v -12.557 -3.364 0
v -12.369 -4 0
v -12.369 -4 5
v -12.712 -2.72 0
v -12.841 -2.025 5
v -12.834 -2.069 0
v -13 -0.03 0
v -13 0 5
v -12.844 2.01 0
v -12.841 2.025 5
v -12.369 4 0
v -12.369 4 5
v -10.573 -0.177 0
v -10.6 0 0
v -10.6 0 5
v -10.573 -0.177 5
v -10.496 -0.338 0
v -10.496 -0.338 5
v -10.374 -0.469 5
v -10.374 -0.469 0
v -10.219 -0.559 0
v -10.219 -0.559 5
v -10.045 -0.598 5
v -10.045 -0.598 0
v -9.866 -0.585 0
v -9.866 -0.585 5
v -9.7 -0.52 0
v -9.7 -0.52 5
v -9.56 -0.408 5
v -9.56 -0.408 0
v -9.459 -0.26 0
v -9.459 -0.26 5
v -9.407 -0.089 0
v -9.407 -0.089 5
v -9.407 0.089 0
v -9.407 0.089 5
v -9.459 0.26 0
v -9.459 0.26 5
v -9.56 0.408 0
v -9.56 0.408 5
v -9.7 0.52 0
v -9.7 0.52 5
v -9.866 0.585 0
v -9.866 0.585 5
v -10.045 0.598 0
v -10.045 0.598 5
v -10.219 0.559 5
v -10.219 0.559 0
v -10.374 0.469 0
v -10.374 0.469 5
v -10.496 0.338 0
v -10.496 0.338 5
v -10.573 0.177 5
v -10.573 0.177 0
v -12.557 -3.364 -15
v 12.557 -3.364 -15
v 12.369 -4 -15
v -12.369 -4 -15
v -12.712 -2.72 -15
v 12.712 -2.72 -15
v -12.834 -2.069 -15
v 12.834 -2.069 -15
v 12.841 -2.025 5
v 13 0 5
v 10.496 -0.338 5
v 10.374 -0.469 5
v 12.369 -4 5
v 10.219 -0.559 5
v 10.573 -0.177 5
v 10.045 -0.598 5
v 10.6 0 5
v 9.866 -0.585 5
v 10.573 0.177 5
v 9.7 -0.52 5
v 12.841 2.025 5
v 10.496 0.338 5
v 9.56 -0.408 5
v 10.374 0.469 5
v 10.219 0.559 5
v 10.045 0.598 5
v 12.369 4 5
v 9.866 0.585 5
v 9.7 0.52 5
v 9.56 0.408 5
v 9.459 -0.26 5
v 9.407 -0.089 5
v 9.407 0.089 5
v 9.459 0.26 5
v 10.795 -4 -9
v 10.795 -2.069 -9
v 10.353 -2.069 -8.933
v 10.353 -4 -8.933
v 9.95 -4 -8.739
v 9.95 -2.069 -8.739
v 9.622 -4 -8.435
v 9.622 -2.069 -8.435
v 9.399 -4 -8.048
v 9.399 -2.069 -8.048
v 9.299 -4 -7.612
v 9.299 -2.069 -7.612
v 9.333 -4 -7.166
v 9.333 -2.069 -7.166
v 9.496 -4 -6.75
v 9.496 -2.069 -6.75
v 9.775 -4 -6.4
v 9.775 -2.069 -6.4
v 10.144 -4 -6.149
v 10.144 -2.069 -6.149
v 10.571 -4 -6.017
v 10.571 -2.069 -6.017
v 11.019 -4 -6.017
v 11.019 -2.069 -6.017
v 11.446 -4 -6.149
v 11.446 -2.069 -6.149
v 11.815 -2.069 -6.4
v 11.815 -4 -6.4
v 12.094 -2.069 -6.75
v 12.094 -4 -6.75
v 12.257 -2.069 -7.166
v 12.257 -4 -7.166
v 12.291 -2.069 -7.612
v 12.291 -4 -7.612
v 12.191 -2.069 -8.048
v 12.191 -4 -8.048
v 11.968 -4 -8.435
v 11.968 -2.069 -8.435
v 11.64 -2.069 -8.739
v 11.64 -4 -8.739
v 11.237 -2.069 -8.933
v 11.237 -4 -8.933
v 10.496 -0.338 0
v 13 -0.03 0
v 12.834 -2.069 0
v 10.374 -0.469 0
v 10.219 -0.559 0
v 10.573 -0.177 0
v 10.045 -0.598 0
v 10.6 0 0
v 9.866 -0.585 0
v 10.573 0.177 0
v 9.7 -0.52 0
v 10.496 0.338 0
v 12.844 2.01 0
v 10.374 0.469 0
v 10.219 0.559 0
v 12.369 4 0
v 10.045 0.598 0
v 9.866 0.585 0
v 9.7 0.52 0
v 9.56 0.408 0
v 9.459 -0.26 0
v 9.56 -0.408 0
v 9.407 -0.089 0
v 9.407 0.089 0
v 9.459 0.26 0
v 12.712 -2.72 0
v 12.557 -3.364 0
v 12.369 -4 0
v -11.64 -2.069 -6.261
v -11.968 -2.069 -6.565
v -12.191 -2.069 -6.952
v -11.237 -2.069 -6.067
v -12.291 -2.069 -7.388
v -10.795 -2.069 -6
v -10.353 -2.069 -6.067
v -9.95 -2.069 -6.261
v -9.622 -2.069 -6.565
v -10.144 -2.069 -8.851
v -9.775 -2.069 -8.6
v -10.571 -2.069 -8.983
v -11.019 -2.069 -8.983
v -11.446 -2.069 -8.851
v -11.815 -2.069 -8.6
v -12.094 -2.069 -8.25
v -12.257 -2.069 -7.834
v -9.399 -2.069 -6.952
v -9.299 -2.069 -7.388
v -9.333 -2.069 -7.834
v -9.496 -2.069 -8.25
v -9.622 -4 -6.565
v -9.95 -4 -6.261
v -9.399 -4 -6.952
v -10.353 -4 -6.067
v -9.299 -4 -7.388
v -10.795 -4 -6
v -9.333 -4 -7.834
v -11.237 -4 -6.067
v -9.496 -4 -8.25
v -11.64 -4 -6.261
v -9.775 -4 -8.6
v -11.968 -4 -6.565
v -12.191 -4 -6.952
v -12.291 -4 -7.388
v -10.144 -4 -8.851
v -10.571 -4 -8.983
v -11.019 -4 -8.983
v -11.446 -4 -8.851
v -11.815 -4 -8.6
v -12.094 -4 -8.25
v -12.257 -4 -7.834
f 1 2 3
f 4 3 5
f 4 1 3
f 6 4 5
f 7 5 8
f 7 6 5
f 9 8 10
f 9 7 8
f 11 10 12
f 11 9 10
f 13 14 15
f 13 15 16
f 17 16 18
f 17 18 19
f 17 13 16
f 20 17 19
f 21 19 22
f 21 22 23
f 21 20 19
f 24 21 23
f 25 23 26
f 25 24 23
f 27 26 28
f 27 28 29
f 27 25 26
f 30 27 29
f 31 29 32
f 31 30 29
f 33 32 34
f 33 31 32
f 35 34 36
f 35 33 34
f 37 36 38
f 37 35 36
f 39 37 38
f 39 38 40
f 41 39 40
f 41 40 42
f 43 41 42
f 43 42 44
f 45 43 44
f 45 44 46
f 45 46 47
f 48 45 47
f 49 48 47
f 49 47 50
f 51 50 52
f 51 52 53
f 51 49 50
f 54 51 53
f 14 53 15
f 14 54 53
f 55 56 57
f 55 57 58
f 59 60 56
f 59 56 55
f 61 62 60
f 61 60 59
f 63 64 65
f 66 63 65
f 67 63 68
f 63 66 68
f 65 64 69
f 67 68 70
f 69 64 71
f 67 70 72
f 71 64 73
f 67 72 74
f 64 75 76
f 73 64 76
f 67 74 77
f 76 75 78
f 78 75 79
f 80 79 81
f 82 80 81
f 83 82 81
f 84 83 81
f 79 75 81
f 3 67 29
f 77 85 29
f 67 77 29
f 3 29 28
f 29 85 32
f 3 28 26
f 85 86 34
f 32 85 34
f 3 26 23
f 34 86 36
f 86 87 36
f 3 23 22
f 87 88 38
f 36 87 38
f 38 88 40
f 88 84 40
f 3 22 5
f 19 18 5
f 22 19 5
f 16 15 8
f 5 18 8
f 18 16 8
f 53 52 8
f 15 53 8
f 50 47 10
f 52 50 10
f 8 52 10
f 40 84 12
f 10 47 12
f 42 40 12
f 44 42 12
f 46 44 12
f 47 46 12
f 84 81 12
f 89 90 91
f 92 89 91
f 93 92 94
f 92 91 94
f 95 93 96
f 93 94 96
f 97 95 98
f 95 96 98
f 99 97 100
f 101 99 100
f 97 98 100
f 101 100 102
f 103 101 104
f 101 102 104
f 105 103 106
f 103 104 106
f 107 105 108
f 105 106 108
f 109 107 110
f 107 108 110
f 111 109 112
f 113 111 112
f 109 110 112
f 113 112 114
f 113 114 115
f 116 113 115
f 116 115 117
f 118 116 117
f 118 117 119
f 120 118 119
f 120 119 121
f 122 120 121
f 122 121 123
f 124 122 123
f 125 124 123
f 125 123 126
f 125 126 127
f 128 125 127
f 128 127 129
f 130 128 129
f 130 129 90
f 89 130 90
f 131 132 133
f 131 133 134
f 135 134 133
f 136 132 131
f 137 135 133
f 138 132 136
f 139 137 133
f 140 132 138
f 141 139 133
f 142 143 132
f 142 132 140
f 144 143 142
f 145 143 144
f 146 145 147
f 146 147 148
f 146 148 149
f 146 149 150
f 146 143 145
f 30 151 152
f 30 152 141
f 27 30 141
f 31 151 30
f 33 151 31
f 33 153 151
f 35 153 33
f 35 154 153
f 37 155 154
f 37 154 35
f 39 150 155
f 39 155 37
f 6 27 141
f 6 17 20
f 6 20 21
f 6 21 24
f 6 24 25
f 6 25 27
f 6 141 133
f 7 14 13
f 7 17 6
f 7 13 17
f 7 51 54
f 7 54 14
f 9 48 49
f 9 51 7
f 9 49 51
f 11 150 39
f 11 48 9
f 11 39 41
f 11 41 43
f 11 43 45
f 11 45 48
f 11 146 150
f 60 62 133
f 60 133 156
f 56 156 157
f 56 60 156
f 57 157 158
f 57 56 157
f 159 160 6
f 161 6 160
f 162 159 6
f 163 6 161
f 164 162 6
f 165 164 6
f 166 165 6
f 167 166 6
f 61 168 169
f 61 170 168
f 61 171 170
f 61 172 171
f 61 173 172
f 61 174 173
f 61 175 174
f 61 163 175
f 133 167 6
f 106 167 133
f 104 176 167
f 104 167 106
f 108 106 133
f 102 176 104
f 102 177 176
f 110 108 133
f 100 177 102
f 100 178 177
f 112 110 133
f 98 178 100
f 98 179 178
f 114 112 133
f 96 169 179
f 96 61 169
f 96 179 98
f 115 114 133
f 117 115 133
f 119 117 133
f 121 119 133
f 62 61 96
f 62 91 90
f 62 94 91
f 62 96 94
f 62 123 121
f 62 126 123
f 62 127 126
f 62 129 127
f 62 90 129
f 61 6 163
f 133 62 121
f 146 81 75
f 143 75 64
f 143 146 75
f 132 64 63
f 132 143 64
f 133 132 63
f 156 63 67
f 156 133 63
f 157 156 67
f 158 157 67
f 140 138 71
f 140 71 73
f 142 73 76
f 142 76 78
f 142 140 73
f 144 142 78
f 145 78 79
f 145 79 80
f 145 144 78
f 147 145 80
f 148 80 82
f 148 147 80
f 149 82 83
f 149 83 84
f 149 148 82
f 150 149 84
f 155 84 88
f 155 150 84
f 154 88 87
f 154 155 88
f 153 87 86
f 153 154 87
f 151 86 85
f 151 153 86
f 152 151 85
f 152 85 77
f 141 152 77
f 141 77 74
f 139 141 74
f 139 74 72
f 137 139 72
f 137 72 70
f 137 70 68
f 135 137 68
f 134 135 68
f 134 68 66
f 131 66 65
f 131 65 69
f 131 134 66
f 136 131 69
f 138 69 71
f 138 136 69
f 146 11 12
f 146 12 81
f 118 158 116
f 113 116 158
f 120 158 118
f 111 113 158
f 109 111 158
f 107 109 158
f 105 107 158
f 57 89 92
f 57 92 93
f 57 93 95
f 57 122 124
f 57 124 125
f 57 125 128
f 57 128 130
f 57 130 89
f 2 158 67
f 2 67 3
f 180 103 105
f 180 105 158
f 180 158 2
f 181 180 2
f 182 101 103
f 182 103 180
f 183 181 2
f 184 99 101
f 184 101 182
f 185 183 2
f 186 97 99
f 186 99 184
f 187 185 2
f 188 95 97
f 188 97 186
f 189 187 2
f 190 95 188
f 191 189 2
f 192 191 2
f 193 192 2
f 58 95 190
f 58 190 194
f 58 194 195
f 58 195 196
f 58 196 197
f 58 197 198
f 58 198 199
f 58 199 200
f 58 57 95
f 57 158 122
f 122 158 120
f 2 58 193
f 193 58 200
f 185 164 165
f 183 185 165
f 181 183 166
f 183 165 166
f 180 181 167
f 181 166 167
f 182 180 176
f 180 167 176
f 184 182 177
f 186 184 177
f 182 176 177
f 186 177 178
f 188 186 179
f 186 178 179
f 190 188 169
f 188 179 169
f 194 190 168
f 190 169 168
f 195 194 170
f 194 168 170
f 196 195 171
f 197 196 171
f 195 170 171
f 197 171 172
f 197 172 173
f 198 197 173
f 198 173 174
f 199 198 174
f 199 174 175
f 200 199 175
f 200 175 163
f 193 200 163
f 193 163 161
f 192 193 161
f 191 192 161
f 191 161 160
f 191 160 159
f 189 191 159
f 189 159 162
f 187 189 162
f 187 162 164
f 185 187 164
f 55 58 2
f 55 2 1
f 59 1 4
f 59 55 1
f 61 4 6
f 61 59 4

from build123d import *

# Parameters (mm, degrees)
SKETCH2_R           = 0.6
BOSS_EXTRUDE2_DEPTH = 5
BOSS_EXTRUDE4_START = 15
BOSS_EXTRUDE4_DEPTH = 15
SKETCH8_R           = 1.5
CUT_EXTRUDE2_DEPTH  = 21.756494148


with BuildPart() as part:
    # Sketch2 → Boss-Extrude2 (new body)
    with BuildSketch(Plane.XY):
        with BuildLine():
            Line((-11.842719282, 4), (11.842719282, 4))
            Line((11.842719282, 4), (12.369316877, 4))
            ThreePointArc((12.369316877, 4), (13, 0), (12.369316877, -4))
            Line((12.369316877, -4), (11.842719282, -4))
            Line((11.842719282, -4), (-11.842719282, -4))
            Line((-11.842719282, -4), (-12.369316877, -4))
            ThreePointArc((-12.369316877, -4), (-13, 0), (-12.369316877, 4))
            Line((-12.369316877, 4), (-11.842719282, 4))
        make_face()
        with Locations((10, 0)):
            Circle(SKETCH2_R, mode=Mode.SUBTRACT)
        with Locations(Location((-10, 0, 0), (0, 0, 180))):
            Circle(SKETCH2_R, mode=Mode.SUBTRACT)
    extrude(amount=BOSS_EXTRUDE2_DEPTH)

    # Sketch7 → Boss-Extrude4 (add)
    with BuildSketch(Plane(origin=(0, 0, 0), x_dir=(-1, 0, 0), z_dir=(0, 0, -1)).offset(BOSS_EXTRUDE4_START)):
        with BuildLine():
            Line((0, -2.068941366), (-12.32759026, -2.068941366))
            Line((-12.32759026, -2.068941366), (-12.834308771, -2.068941366))
            ThreePointArc((-12.834308771, -2.068941366), (-12.6387473, -3.04336437), (-12.369316877, -4))
            Line((-12.369316877, -4), (-11.842719282, -4))
            Line((-11.842719282, -4), (0, -4))
            Line((0, -4), (11.842719282, -4))
            Line((11.842719282, -4), (12.369316877, -4))
            ThreePointArc((12.369316877, -4), (12.6387473, -3.04336437), (12.834308771, -2.068941366))
            Line((12.834308771, -2.068941366), (12.32759026, -2.068941366))
            Line((12.32759026, -2.068941366), (0, -2.068941366))
        make_face()
    extrude(amount=-BOSS_EXTRUDE4_DEPTH)

    # Sketch8 → Cut-Extrude2 (cut, through all)
    with BuildSketch(Plane(origin=(0, -2.068941366, 0), x_dir=(1, 0, 0), z_dir=(0, 1, 0))):
        with Locations(Location((-10.795, 7.5, 0), (0, 0, 270))):
            Circle(SKETCH8_R)
        with Locations(Location((10.795, 7.5, 0), (0, 0, 90))):
            Circle(SKETCH8_R)
    extrude(amount=-CUT_EXTRUDE2_DEPTH, mode=Mode.SUBTRACT)


solid = part.part
